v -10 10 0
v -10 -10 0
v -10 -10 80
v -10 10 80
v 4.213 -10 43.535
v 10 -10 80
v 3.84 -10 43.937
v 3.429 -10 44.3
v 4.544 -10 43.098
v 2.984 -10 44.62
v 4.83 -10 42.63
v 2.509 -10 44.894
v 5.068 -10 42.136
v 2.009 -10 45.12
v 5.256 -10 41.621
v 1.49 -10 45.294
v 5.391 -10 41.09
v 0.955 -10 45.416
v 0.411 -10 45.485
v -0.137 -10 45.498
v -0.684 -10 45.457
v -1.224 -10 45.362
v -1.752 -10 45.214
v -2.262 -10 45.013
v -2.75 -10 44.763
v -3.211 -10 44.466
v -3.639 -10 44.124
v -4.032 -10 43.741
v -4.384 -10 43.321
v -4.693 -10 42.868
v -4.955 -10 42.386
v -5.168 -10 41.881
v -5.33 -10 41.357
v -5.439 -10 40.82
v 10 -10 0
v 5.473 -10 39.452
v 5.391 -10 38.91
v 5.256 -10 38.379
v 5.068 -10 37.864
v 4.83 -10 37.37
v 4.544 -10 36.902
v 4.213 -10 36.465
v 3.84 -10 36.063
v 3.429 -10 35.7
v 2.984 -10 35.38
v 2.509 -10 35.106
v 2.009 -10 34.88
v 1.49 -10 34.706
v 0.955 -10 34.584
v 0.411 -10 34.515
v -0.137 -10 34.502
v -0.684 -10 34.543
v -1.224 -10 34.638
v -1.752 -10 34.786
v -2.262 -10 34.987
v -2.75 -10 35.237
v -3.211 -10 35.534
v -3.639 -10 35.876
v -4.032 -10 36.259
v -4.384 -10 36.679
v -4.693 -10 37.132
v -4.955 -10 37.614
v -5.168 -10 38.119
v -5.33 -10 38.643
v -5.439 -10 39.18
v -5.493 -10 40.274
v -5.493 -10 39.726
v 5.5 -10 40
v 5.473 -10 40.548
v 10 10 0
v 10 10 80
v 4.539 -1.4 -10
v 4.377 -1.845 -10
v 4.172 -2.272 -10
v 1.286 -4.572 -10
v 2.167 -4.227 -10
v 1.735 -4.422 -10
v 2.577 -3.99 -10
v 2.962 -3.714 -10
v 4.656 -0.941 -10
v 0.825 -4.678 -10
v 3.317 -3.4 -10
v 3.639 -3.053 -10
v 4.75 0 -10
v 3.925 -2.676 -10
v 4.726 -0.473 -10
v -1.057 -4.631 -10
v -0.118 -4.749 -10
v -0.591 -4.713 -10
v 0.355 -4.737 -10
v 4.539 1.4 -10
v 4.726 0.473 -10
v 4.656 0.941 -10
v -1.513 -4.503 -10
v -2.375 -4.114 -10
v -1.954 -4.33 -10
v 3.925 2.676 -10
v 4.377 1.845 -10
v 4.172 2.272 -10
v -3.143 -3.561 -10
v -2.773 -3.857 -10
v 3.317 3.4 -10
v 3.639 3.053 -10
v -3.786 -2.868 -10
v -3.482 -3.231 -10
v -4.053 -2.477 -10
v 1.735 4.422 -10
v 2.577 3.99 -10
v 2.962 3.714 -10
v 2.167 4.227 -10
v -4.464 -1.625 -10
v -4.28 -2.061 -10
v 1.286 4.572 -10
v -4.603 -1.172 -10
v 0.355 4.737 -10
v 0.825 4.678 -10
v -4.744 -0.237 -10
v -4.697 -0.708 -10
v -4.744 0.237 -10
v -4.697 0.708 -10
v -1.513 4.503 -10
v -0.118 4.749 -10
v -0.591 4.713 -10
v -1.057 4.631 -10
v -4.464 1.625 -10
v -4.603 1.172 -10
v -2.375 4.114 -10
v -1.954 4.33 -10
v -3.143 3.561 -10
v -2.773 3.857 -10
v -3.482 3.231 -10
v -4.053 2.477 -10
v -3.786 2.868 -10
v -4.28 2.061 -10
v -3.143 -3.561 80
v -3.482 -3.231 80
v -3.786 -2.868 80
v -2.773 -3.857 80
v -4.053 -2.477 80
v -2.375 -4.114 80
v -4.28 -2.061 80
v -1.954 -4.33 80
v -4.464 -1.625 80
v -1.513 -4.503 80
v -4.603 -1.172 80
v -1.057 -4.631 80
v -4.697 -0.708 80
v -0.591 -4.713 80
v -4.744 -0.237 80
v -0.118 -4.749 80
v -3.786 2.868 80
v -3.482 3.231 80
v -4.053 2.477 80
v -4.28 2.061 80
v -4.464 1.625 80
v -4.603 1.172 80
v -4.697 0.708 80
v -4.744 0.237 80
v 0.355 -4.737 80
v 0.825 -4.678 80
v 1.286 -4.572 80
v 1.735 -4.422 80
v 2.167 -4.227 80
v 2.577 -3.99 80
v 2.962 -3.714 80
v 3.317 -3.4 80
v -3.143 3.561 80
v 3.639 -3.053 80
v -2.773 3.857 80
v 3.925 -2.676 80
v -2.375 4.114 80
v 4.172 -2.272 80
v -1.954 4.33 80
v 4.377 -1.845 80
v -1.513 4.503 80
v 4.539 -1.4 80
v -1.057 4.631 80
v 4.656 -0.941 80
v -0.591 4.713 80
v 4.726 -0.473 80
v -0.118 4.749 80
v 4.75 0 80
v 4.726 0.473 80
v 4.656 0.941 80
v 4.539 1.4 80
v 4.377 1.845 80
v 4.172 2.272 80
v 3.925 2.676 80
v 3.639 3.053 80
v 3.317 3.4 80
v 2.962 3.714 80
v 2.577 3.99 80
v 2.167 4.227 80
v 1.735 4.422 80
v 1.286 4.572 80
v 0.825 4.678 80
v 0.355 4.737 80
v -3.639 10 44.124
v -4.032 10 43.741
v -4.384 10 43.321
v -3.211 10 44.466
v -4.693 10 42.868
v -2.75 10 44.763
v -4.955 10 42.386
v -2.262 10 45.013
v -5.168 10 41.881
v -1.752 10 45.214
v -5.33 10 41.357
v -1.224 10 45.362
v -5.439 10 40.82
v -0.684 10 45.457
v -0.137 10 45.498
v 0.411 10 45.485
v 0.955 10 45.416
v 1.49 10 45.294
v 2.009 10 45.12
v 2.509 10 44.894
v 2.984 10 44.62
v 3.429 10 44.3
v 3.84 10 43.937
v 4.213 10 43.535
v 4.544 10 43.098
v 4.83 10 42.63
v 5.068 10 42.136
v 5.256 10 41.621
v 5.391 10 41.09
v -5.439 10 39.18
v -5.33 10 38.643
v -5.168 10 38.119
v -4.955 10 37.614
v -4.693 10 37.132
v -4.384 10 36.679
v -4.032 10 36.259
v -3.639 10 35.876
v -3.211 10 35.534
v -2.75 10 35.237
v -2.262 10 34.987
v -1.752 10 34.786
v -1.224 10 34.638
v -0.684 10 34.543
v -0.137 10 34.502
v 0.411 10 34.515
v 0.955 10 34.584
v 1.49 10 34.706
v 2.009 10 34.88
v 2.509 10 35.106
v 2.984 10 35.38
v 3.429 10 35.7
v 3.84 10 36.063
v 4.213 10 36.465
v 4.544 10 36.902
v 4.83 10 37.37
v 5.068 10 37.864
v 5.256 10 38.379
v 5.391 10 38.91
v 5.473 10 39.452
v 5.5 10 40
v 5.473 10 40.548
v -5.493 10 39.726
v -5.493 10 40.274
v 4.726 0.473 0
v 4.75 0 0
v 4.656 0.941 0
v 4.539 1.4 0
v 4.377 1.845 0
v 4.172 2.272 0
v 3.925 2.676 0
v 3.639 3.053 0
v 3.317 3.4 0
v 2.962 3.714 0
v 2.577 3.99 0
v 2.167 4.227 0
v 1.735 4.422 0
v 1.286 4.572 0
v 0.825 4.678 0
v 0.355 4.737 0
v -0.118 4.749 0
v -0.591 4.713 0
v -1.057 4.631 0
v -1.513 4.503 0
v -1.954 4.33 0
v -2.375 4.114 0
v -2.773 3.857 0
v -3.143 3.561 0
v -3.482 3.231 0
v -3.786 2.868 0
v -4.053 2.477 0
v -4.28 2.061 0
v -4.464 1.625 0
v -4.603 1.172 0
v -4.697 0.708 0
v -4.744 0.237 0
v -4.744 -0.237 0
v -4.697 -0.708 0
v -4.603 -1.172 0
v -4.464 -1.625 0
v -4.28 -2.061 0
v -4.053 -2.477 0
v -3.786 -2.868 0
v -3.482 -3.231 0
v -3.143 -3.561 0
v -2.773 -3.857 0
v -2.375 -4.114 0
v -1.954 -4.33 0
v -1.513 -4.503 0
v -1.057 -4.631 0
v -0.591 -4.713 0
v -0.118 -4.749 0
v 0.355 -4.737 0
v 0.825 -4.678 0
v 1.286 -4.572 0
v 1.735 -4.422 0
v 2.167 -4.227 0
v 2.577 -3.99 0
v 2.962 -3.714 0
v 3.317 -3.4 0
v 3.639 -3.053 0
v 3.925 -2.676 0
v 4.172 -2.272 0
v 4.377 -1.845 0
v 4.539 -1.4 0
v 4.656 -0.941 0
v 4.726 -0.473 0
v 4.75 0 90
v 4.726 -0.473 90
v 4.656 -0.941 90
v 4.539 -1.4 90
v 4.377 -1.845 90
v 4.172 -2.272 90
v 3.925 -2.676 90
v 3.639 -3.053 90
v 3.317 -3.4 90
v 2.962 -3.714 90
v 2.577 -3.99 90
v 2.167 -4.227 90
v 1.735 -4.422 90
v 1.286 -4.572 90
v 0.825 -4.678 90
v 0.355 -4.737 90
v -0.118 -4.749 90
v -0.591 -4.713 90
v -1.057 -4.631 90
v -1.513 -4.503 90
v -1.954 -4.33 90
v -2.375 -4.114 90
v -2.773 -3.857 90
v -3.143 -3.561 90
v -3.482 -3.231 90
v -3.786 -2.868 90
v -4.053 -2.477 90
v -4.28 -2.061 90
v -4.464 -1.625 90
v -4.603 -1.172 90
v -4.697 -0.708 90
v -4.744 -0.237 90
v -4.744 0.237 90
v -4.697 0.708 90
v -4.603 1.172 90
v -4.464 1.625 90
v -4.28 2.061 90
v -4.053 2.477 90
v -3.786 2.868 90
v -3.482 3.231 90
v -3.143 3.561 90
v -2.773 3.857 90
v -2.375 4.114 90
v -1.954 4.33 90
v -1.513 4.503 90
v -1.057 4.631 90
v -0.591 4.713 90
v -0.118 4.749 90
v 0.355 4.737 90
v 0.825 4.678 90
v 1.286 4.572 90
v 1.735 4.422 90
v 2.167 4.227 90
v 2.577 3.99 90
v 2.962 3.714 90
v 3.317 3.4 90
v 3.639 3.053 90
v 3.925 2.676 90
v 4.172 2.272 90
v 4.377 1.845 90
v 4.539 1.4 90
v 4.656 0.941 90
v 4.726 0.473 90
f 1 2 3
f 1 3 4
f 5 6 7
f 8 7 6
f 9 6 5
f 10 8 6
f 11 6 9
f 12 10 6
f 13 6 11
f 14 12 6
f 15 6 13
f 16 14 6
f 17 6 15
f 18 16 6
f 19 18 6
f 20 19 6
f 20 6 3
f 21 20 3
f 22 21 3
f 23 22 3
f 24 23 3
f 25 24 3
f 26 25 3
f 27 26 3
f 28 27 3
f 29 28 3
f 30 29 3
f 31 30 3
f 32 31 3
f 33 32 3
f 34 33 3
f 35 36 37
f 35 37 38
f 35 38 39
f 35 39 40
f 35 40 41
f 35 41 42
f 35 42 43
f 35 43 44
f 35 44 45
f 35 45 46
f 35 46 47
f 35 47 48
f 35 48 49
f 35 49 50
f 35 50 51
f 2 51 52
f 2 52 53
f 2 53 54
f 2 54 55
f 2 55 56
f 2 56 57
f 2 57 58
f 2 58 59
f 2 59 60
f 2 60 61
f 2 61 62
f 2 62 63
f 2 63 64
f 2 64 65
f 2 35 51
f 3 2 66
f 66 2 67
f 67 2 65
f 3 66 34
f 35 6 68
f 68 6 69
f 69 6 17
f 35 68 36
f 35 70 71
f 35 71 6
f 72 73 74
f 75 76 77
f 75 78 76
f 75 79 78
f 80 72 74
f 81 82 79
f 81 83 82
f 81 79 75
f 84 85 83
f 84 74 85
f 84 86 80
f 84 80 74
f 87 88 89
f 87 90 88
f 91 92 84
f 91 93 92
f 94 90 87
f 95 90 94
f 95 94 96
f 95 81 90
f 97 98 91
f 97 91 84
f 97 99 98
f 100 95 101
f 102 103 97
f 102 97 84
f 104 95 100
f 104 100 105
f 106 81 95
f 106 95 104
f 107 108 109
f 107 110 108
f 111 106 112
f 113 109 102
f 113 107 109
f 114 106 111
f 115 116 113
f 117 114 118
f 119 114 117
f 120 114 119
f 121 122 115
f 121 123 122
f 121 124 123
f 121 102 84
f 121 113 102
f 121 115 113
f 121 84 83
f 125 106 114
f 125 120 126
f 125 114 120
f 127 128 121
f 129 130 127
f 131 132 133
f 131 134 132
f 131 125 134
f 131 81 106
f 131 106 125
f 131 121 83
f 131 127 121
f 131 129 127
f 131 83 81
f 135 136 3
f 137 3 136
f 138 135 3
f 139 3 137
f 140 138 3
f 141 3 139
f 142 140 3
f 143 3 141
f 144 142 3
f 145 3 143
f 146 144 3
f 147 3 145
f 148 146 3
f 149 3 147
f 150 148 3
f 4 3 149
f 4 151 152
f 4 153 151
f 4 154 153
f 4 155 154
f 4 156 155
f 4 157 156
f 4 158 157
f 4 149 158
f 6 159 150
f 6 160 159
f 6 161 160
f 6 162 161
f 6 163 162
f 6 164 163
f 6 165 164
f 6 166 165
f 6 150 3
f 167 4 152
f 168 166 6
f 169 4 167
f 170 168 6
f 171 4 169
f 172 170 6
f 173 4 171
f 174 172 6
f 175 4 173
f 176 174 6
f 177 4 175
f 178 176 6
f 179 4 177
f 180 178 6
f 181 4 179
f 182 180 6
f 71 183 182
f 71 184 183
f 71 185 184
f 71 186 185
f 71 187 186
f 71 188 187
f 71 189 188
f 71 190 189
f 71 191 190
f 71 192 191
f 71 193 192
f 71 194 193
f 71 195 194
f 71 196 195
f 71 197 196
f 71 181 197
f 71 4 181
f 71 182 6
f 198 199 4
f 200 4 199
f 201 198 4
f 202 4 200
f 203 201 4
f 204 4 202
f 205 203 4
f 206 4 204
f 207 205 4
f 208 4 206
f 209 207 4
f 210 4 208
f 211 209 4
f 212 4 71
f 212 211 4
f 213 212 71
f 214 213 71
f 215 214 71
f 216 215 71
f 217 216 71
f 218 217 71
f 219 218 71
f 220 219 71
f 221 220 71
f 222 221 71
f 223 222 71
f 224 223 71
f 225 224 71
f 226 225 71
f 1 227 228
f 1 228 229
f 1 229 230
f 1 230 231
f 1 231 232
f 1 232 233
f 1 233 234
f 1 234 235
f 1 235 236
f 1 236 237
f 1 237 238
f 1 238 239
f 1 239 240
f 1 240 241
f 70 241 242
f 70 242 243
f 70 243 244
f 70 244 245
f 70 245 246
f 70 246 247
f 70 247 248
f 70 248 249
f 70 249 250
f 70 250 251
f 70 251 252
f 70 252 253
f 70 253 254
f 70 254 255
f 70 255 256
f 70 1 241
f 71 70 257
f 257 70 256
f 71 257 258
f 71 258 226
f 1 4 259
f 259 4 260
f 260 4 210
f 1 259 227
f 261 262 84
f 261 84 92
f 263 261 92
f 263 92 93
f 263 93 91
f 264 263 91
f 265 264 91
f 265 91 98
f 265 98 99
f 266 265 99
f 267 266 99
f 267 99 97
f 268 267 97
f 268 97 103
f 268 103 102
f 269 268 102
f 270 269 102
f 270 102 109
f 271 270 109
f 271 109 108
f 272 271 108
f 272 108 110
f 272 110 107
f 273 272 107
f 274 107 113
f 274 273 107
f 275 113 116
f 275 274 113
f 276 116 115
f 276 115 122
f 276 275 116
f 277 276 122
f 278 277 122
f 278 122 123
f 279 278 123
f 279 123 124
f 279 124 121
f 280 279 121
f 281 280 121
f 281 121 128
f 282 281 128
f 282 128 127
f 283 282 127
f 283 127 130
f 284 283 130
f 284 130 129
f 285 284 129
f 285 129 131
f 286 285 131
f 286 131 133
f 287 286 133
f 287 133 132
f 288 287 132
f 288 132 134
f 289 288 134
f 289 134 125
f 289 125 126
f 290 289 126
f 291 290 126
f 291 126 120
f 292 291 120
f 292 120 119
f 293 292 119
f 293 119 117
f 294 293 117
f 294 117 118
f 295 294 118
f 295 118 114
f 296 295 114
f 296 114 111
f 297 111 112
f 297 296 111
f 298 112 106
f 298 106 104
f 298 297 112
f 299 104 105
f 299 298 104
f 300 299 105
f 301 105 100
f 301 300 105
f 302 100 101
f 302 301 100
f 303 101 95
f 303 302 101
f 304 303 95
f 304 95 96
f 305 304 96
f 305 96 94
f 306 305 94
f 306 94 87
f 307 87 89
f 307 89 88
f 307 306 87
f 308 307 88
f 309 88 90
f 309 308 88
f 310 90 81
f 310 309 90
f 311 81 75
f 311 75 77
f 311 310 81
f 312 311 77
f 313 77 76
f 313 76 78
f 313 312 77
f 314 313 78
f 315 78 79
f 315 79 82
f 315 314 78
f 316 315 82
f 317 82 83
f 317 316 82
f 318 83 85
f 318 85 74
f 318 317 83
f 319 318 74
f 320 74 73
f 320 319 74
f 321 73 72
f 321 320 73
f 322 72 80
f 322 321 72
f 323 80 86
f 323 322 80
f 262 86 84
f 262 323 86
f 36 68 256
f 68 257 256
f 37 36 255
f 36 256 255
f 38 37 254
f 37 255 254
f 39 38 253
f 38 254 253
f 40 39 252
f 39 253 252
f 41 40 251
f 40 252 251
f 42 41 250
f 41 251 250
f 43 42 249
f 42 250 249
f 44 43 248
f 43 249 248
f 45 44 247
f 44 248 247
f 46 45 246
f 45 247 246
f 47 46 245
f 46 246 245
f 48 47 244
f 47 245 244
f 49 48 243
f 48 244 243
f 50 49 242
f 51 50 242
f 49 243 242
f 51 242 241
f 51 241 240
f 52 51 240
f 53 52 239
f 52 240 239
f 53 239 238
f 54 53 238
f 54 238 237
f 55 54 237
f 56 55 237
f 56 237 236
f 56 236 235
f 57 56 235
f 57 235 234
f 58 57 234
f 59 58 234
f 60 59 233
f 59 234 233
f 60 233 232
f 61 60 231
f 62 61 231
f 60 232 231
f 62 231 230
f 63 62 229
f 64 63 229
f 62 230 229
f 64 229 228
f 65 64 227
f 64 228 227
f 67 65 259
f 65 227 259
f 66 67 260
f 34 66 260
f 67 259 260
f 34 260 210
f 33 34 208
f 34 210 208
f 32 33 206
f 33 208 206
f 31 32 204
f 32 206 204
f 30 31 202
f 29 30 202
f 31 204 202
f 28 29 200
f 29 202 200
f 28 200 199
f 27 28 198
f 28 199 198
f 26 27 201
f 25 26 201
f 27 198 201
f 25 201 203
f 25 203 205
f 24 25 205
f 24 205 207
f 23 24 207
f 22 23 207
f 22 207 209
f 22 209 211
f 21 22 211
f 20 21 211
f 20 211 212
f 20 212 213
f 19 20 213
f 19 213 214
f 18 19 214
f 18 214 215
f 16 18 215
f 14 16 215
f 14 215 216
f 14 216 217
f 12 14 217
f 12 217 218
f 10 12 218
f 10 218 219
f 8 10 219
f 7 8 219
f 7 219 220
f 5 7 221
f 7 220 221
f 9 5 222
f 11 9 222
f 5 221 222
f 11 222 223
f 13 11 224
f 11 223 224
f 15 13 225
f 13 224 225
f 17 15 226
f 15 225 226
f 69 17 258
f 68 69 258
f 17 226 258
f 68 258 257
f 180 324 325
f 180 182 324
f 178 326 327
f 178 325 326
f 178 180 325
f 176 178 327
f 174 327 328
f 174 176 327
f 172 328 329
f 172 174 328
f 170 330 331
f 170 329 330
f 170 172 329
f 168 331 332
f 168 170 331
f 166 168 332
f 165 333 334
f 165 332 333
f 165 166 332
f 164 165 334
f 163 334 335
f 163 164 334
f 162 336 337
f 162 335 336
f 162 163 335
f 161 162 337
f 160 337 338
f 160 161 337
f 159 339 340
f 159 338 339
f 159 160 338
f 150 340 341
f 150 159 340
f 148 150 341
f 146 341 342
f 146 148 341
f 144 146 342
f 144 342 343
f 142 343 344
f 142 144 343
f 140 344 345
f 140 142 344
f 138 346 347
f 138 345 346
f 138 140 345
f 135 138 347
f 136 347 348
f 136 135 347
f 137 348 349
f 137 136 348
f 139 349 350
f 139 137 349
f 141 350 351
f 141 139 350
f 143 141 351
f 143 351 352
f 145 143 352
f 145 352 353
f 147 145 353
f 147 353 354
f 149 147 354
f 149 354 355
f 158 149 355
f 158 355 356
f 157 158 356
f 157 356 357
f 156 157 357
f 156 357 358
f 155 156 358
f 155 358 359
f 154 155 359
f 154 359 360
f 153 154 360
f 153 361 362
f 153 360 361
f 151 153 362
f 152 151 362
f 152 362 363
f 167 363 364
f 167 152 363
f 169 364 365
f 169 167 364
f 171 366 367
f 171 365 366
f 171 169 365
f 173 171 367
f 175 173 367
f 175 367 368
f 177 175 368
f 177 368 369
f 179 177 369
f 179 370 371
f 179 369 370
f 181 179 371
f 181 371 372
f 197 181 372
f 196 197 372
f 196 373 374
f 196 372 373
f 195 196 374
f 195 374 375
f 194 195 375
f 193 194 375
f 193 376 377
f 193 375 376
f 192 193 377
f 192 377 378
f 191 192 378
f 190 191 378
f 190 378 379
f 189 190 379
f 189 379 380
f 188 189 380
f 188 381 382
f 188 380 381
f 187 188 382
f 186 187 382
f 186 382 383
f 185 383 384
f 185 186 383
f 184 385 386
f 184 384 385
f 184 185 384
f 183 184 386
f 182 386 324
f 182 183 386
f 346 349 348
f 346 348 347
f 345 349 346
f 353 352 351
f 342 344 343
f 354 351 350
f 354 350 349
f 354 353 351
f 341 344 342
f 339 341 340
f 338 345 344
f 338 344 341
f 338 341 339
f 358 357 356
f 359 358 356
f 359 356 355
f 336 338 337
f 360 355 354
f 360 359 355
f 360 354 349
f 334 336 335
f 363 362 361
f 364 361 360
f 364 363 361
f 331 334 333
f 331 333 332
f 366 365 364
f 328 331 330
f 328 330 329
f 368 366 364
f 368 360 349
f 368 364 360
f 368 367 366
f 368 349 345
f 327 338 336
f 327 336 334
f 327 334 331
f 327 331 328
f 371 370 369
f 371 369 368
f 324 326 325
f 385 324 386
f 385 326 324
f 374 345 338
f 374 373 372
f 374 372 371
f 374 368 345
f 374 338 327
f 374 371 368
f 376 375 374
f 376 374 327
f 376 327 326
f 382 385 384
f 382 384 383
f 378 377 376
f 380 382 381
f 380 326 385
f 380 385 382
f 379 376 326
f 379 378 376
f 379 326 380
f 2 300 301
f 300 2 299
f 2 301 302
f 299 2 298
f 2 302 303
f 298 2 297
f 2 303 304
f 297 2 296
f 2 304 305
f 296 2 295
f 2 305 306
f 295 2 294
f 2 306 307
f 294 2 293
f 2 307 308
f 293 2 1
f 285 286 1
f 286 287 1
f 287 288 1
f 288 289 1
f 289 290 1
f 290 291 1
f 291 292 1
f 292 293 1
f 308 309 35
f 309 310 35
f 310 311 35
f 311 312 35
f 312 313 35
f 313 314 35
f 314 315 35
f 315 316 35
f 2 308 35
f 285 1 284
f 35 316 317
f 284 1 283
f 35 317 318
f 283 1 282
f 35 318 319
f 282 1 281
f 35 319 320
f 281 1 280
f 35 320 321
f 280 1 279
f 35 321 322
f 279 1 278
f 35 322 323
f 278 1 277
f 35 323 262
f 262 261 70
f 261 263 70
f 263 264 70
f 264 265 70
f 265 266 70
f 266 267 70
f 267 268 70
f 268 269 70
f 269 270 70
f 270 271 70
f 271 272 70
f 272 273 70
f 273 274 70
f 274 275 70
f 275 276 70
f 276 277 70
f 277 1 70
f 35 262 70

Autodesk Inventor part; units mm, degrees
ref_plane "YZ Plane" through (0, 0, 0) normal (1, 0, 0) x (0, 1, 0)
sketch "Sketch1" plane through (0, 0, 0) normal (0, 0, 1) x (1, 0, 0)
  line L0 (-10, 10) -> (10, 10)
  line L1 (10, 10) -> (10, -10)
  line L2 (10, -10) -> (-10, -10)
  line L3 (-10, -10) -> (-10, 10)
  line L4 (-10, 10) -> (10, -10) construction
  line L5 (10, 10) -> (-10, -10) construction
  point P0 (0, 0)
  dimension "d0" = 20
  dimension "d1" = 20
extrude "Extrusion1" add sketch "Sketch1" along normal blind 80
sketch "Sketch2" plane through (0, 0, 80) normal (0, 0, 1) x (1, 0, 0)
  circle A0 centre (0, 0) radius 4.75
  dimension "d4" = 9.5
extrude "Extrusion2" add sketch "Sketch2" along normal blind 10
ref_plane "Work Plane1" through (0, 0, 40) normal (0, 0, 1) x (1, 0, 0)
mirror "Mirror1" about plane through (0, 0, 40) normal (0, 0, 1) of "Extrusion2"
ref_plane "Work Plane2" through (-8, 10, 0) normal (0, 1, 0) x (1, 0, 0)
sketch "Sketch3" plane through (-8, 10, 0) normal (0, 1, 0) x (1, 0, 0)
  line L0 (-2, -80) -> (-2, 0) projected
  line L1 (-2, -40) -> (18, -40)
  line L2 (18, 0) -> (18, -80) projected
  circle A0 centre (8, -40) radius 5.5
  point P0 (8, 0)
  dimension "d8" = 11
extrude "Extrusion3" cut sketch "Sketch3" against normal through all
properties part number "FP V2 Arm Connector"
